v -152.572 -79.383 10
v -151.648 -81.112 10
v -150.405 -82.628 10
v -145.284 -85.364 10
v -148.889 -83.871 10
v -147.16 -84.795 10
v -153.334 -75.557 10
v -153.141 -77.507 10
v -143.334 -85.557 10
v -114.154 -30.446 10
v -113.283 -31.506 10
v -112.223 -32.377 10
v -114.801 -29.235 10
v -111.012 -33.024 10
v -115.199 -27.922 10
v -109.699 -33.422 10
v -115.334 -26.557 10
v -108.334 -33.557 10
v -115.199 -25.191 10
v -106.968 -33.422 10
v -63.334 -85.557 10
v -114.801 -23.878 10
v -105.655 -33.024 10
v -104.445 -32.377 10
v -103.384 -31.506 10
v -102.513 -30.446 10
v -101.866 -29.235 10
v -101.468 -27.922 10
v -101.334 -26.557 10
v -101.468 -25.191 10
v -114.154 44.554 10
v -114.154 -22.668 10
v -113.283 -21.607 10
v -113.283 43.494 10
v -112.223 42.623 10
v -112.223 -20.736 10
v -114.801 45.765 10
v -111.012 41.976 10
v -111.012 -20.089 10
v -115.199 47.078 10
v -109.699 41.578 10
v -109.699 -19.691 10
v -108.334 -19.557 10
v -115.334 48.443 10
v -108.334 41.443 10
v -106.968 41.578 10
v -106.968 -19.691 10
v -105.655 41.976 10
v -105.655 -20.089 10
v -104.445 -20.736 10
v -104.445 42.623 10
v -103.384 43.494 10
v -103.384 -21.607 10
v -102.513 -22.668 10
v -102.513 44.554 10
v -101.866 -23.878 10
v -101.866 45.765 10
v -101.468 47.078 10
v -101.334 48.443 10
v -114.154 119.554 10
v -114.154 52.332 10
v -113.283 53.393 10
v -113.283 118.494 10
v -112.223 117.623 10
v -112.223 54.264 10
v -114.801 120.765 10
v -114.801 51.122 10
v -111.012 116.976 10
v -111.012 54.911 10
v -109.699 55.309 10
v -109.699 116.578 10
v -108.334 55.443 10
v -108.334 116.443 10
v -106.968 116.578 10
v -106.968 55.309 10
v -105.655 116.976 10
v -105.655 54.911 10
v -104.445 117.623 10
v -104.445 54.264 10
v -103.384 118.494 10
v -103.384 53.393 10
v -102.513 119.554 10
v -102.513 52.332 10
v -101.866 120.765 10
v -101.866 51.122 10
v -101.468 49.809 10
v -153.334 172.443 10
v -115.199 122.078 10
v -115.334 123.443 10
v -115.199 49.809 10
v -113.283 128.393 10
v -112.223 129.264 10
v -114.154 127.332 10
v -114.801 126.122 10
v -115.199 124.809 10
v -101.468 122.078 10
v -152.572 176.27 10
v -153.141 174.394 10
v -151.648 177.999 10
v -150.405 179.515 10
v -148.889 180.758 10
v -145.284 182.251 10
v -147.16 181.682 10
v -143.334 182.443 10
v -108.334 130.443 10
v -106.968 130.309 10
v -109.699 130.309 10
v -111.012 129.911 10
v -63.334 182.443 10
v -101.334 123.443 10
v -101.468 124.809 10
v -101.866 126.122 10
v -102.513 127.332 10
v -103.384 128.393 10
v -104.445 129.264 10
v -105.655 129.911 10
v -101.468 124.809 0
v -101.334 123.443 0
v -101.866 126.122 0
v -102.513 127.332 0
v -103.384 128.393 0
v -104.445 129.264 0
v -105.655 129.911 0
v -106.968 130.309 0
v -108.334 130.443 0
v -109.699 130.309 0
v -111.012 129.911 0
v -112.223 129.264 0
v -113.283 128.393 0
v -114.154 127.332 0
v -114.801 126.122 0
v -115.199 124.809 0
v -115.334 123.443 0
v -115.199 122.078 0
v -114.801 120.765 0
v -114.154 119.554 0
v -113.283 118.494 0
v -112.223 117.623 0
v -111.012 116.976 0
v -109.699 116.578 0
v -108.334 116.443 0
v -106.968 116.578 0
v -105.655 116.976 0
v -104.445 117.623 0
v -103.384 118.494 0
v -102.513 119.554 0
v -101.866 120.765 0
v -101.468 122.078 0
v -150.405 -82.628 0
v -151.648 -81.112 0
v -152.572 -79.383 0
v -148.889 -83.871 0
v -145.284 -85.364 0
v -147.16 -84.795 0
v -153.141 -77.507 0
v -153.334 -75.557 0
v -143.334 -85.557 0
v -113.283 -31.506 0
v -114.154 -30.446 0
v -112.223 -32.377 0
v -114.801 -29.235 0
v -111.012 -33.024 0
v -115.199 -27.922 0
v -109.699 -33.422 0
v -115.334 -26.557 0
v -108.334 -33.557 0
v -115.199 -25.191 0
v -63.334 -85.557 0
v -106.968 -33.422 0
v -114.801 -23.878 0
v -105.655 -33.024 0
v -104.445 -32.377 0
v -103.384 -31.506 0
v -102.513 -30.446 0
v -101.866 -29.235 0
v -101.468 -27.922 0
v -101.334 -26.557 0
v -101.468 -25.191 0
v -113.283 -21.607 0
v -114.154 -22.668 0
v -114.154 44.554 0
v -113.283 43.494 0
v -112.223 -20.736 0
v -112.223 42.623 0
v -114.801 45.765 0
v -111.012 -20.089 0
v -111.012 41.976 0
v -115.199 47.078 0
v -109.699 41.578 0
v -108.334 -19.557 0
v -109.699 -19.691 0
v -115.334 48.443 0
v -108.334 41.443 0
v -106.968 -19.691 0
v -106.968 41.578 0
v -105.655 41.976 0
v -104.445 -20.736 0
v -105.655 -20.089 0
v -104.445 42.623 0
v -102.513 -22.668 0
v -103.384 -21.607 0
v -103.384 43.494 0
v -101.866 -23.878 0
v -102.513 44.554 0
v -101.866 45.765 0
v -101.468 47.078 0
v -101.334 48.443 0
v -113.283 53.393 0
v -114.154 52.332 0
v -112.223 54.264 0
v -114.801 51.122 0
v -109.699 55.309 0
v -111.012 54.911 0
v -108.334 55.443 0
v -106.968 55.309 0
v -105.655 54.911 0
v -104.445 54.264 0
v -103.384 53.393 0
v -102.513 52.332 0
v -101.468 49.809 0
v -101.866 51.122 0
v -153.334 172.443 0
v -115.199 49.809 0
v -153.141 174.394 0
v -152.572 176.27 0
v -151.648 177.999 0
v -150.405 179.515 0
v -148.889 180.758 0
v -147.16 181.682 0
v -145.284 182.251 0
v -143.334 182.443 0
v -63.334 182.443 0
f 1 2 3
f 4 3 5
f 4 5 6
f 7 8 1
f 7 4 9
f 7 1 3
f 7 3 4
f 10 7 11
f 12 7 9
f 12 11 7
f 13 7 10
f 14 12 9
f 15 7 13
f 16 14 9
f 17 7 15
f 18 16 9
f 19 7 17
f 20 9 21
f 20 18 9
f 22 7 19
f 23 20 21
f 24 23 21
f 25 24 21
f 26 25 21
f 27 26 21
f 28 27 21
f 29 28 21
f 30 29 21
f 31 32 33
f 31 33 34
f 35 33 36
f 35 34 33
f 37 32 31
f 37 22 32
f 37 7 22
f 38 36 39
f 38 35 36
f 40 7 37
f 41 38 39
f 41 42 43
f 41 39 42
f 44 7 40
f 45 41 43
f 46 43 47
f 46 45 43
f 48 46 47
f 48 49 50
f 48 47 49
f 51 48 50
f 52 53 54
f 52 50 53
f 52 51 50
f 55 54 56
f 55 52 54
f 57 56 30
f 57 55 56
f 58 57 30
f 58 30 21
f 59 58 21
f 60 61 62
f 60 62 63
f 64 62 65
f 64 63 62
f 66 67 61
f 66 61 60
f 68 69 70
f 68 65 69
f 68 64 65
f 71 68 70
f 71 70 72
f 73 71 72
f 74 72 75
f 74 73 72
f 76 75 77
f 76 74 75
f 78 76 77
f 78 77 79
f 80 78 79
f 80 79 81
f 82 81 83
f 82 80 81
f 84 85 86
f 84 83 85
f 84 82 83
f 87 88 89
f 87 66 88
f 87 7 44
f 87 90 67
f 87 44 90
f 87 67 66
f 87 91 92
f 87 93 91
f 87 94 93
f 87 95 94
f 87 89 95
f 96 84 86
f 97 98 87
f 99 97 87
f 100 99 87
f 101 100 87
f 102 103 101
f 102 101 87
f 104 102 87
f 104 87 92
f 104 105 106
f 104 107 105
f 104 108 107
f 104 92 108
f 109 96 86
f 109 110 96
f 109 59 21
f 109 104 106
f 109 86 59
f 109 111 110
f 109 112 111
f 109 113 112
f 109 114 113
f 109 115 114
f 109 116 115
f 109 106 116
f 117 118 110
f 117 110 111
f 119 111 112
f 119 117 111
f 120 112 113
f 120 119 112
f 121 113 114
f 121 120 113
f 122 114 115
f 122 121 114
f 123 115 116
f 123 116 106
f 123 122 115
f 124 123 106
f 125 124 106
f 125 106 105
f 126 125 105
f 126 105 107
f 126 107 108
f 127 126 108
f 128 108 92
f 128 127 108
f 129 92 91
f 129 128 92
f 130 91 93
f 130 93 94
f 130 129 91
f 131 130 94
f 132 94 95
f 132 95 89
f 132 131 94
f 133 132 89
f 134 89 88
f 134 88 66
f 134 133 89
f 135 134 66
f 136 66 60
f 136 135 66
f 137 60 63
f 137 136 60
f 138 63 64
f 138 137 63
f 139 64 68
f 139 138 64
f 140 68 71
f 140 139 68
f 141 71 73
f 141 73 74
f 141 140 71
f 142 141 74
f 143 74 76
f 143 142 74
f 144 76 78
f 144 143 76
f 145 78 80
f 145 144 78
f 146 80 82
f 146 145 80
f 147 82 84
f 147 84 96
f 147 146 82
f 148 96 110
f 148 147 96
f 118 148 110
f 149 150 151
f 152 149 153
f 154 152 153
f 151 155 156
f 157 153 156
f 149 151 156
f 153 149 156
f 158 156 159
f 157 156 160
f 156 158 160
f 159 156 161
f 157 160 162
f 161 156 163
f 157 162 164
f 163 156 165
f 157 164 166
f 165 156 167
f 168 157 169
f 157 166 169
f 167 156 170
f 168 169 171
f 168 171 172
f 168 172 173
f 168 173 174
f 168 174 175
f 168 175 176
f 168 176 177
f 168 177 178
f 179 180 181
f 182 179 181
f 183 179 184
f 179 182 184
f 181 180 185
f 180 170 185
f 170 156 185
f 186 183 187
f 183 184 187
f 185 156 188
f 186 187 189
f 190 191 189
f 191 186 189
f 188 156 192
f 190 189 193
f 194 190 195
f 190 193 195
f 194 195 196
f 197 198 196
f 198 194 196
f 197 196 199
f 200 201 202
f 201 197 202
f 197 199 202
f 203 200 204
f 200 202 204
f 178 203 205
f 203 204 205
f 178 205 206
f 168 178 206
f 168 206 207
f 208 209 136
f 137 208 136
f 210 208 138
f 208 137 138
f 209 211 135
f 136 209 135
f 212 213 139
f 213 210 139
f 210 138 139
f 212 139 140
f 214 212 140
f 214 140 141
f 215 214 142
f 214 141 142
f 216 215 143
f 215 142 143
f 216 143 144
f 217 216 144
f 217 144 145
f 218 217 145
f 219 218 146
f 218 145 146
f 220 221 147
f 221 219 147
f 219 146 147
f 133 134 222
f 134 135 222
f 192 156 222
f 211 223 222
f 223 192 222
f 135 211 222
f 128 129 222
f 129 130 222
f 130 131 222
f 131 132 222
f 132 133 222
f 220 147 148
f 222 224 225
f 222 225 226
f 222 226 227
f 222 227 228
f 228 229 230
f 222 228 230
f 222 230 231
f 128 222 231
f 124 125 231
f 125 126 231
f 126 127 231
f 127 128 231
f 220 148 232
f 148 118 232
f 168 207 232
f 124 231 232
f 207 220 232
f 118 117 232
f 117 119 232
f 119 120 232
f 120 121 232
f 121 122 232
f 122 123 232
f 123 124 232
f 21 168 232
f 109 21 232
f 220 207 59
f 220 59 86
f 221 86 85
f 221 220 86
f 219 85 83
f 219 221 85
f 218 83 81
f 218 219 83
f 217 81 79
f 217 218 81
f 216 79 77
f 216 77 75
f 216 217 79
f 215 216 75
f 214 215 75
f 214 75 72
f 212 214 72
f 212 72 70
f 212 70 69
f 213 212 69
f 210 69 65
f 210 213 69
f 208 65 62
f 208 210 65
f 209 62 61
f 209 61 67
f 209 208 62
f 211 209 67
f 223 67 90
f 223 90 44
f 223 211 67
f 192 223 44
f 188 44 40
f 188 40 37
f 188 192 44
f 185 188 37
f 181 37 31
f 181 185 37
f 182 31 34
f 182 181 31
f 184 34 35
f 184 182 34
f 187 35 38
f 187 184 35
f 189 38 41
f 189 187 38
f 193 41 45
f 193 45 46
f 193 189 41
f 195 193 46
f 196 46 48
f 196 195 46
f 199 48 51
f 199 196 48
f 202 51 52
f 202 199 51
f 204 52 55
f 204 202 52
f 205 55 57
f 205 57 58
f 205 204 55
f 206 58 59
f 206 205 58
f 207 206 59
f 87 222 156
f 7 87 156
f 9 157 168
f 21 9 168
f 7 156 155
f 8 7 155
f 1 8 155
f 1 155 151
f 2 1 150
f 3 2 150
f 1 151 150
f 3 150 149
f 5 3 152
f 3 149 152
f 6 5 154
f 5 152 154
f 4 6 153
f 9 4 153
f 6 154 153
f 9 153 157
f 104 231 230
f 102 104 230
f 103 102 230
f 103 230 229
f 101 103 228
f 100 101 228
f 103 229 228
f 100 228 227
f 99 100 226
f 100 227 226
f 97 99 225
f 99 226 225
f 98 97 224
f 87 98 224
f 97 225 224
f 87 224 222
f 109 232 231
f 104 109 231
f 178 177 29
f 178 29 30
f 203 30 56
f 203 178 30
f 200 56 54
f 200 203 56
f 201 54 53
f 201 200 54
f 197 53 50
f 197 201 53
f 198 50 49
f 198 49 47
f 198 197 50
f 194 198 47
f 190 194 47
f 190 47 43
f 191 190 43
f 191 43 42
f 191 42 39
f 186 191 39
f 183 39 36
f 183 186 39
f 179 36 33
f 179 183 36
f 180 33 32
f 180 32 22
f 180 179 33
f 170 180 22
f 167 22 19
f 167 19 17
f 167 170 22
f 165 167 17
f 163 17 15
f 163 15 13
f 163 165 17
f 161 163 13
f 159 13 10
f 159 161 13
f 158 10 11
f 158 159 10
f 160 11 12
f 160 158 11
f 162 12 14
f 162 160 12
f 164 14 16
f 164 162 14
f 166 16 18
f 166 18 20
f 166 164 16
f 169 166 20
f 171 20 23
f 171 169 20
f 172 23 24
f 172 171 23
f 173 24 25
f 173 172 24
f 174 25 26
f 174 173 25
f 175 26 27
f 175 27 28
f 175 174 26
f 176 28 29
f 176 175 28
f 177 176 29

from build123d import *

# Parameters (mm, degrees)
SKETCH1_R           = 7
BOSS_EXTRUDE1_DEPTH = 10


with BuildPart() as part:
    # Sketch1 → Boss-Extrude1 (new body)
    with BuildSketch(Plane.XY):
        with BuildLine():
            Line((-63.333523535, 182.443481279), (-143.333523535, 182.443481279))
            ThreePointArc((-143.333523535, 182.443481279), (-150.404591346, 179.514549091), (-153.333523535, 172.443481279))
            Line((-153.333523535, 172.443481279), (-153.333523535, -75.556518721))
            ThreePointArc((-153.333523535, -75.556518721), (-150.404591346, -82.627586533), (-143.333523535, -85.556518721))
            Line((-143.333523535, -85.556518721), (-63.333523535, -85.556518721))
            Line((-63.333523535, -85.556518721), (-63.333523535, 182.443481279))
        make_face()
        with Locations((-108.333523535, 48.443481279)):
            Circle(SKETCH1_R, mode=Mode.SUBTRACT)
        with Locations((-108.333523535, 123.443481279)):
            Circle(SKETCH1_R, mode=Mode.SUBTRACT)
        with Locations((-108.333523535, -26.556518721)):
            Circle(SKETCH1_R, mode=Mode.SUBTRACT)
    extrude(amount=BOSS_EXTRUDE1_DEPTH)


solid = part.part
